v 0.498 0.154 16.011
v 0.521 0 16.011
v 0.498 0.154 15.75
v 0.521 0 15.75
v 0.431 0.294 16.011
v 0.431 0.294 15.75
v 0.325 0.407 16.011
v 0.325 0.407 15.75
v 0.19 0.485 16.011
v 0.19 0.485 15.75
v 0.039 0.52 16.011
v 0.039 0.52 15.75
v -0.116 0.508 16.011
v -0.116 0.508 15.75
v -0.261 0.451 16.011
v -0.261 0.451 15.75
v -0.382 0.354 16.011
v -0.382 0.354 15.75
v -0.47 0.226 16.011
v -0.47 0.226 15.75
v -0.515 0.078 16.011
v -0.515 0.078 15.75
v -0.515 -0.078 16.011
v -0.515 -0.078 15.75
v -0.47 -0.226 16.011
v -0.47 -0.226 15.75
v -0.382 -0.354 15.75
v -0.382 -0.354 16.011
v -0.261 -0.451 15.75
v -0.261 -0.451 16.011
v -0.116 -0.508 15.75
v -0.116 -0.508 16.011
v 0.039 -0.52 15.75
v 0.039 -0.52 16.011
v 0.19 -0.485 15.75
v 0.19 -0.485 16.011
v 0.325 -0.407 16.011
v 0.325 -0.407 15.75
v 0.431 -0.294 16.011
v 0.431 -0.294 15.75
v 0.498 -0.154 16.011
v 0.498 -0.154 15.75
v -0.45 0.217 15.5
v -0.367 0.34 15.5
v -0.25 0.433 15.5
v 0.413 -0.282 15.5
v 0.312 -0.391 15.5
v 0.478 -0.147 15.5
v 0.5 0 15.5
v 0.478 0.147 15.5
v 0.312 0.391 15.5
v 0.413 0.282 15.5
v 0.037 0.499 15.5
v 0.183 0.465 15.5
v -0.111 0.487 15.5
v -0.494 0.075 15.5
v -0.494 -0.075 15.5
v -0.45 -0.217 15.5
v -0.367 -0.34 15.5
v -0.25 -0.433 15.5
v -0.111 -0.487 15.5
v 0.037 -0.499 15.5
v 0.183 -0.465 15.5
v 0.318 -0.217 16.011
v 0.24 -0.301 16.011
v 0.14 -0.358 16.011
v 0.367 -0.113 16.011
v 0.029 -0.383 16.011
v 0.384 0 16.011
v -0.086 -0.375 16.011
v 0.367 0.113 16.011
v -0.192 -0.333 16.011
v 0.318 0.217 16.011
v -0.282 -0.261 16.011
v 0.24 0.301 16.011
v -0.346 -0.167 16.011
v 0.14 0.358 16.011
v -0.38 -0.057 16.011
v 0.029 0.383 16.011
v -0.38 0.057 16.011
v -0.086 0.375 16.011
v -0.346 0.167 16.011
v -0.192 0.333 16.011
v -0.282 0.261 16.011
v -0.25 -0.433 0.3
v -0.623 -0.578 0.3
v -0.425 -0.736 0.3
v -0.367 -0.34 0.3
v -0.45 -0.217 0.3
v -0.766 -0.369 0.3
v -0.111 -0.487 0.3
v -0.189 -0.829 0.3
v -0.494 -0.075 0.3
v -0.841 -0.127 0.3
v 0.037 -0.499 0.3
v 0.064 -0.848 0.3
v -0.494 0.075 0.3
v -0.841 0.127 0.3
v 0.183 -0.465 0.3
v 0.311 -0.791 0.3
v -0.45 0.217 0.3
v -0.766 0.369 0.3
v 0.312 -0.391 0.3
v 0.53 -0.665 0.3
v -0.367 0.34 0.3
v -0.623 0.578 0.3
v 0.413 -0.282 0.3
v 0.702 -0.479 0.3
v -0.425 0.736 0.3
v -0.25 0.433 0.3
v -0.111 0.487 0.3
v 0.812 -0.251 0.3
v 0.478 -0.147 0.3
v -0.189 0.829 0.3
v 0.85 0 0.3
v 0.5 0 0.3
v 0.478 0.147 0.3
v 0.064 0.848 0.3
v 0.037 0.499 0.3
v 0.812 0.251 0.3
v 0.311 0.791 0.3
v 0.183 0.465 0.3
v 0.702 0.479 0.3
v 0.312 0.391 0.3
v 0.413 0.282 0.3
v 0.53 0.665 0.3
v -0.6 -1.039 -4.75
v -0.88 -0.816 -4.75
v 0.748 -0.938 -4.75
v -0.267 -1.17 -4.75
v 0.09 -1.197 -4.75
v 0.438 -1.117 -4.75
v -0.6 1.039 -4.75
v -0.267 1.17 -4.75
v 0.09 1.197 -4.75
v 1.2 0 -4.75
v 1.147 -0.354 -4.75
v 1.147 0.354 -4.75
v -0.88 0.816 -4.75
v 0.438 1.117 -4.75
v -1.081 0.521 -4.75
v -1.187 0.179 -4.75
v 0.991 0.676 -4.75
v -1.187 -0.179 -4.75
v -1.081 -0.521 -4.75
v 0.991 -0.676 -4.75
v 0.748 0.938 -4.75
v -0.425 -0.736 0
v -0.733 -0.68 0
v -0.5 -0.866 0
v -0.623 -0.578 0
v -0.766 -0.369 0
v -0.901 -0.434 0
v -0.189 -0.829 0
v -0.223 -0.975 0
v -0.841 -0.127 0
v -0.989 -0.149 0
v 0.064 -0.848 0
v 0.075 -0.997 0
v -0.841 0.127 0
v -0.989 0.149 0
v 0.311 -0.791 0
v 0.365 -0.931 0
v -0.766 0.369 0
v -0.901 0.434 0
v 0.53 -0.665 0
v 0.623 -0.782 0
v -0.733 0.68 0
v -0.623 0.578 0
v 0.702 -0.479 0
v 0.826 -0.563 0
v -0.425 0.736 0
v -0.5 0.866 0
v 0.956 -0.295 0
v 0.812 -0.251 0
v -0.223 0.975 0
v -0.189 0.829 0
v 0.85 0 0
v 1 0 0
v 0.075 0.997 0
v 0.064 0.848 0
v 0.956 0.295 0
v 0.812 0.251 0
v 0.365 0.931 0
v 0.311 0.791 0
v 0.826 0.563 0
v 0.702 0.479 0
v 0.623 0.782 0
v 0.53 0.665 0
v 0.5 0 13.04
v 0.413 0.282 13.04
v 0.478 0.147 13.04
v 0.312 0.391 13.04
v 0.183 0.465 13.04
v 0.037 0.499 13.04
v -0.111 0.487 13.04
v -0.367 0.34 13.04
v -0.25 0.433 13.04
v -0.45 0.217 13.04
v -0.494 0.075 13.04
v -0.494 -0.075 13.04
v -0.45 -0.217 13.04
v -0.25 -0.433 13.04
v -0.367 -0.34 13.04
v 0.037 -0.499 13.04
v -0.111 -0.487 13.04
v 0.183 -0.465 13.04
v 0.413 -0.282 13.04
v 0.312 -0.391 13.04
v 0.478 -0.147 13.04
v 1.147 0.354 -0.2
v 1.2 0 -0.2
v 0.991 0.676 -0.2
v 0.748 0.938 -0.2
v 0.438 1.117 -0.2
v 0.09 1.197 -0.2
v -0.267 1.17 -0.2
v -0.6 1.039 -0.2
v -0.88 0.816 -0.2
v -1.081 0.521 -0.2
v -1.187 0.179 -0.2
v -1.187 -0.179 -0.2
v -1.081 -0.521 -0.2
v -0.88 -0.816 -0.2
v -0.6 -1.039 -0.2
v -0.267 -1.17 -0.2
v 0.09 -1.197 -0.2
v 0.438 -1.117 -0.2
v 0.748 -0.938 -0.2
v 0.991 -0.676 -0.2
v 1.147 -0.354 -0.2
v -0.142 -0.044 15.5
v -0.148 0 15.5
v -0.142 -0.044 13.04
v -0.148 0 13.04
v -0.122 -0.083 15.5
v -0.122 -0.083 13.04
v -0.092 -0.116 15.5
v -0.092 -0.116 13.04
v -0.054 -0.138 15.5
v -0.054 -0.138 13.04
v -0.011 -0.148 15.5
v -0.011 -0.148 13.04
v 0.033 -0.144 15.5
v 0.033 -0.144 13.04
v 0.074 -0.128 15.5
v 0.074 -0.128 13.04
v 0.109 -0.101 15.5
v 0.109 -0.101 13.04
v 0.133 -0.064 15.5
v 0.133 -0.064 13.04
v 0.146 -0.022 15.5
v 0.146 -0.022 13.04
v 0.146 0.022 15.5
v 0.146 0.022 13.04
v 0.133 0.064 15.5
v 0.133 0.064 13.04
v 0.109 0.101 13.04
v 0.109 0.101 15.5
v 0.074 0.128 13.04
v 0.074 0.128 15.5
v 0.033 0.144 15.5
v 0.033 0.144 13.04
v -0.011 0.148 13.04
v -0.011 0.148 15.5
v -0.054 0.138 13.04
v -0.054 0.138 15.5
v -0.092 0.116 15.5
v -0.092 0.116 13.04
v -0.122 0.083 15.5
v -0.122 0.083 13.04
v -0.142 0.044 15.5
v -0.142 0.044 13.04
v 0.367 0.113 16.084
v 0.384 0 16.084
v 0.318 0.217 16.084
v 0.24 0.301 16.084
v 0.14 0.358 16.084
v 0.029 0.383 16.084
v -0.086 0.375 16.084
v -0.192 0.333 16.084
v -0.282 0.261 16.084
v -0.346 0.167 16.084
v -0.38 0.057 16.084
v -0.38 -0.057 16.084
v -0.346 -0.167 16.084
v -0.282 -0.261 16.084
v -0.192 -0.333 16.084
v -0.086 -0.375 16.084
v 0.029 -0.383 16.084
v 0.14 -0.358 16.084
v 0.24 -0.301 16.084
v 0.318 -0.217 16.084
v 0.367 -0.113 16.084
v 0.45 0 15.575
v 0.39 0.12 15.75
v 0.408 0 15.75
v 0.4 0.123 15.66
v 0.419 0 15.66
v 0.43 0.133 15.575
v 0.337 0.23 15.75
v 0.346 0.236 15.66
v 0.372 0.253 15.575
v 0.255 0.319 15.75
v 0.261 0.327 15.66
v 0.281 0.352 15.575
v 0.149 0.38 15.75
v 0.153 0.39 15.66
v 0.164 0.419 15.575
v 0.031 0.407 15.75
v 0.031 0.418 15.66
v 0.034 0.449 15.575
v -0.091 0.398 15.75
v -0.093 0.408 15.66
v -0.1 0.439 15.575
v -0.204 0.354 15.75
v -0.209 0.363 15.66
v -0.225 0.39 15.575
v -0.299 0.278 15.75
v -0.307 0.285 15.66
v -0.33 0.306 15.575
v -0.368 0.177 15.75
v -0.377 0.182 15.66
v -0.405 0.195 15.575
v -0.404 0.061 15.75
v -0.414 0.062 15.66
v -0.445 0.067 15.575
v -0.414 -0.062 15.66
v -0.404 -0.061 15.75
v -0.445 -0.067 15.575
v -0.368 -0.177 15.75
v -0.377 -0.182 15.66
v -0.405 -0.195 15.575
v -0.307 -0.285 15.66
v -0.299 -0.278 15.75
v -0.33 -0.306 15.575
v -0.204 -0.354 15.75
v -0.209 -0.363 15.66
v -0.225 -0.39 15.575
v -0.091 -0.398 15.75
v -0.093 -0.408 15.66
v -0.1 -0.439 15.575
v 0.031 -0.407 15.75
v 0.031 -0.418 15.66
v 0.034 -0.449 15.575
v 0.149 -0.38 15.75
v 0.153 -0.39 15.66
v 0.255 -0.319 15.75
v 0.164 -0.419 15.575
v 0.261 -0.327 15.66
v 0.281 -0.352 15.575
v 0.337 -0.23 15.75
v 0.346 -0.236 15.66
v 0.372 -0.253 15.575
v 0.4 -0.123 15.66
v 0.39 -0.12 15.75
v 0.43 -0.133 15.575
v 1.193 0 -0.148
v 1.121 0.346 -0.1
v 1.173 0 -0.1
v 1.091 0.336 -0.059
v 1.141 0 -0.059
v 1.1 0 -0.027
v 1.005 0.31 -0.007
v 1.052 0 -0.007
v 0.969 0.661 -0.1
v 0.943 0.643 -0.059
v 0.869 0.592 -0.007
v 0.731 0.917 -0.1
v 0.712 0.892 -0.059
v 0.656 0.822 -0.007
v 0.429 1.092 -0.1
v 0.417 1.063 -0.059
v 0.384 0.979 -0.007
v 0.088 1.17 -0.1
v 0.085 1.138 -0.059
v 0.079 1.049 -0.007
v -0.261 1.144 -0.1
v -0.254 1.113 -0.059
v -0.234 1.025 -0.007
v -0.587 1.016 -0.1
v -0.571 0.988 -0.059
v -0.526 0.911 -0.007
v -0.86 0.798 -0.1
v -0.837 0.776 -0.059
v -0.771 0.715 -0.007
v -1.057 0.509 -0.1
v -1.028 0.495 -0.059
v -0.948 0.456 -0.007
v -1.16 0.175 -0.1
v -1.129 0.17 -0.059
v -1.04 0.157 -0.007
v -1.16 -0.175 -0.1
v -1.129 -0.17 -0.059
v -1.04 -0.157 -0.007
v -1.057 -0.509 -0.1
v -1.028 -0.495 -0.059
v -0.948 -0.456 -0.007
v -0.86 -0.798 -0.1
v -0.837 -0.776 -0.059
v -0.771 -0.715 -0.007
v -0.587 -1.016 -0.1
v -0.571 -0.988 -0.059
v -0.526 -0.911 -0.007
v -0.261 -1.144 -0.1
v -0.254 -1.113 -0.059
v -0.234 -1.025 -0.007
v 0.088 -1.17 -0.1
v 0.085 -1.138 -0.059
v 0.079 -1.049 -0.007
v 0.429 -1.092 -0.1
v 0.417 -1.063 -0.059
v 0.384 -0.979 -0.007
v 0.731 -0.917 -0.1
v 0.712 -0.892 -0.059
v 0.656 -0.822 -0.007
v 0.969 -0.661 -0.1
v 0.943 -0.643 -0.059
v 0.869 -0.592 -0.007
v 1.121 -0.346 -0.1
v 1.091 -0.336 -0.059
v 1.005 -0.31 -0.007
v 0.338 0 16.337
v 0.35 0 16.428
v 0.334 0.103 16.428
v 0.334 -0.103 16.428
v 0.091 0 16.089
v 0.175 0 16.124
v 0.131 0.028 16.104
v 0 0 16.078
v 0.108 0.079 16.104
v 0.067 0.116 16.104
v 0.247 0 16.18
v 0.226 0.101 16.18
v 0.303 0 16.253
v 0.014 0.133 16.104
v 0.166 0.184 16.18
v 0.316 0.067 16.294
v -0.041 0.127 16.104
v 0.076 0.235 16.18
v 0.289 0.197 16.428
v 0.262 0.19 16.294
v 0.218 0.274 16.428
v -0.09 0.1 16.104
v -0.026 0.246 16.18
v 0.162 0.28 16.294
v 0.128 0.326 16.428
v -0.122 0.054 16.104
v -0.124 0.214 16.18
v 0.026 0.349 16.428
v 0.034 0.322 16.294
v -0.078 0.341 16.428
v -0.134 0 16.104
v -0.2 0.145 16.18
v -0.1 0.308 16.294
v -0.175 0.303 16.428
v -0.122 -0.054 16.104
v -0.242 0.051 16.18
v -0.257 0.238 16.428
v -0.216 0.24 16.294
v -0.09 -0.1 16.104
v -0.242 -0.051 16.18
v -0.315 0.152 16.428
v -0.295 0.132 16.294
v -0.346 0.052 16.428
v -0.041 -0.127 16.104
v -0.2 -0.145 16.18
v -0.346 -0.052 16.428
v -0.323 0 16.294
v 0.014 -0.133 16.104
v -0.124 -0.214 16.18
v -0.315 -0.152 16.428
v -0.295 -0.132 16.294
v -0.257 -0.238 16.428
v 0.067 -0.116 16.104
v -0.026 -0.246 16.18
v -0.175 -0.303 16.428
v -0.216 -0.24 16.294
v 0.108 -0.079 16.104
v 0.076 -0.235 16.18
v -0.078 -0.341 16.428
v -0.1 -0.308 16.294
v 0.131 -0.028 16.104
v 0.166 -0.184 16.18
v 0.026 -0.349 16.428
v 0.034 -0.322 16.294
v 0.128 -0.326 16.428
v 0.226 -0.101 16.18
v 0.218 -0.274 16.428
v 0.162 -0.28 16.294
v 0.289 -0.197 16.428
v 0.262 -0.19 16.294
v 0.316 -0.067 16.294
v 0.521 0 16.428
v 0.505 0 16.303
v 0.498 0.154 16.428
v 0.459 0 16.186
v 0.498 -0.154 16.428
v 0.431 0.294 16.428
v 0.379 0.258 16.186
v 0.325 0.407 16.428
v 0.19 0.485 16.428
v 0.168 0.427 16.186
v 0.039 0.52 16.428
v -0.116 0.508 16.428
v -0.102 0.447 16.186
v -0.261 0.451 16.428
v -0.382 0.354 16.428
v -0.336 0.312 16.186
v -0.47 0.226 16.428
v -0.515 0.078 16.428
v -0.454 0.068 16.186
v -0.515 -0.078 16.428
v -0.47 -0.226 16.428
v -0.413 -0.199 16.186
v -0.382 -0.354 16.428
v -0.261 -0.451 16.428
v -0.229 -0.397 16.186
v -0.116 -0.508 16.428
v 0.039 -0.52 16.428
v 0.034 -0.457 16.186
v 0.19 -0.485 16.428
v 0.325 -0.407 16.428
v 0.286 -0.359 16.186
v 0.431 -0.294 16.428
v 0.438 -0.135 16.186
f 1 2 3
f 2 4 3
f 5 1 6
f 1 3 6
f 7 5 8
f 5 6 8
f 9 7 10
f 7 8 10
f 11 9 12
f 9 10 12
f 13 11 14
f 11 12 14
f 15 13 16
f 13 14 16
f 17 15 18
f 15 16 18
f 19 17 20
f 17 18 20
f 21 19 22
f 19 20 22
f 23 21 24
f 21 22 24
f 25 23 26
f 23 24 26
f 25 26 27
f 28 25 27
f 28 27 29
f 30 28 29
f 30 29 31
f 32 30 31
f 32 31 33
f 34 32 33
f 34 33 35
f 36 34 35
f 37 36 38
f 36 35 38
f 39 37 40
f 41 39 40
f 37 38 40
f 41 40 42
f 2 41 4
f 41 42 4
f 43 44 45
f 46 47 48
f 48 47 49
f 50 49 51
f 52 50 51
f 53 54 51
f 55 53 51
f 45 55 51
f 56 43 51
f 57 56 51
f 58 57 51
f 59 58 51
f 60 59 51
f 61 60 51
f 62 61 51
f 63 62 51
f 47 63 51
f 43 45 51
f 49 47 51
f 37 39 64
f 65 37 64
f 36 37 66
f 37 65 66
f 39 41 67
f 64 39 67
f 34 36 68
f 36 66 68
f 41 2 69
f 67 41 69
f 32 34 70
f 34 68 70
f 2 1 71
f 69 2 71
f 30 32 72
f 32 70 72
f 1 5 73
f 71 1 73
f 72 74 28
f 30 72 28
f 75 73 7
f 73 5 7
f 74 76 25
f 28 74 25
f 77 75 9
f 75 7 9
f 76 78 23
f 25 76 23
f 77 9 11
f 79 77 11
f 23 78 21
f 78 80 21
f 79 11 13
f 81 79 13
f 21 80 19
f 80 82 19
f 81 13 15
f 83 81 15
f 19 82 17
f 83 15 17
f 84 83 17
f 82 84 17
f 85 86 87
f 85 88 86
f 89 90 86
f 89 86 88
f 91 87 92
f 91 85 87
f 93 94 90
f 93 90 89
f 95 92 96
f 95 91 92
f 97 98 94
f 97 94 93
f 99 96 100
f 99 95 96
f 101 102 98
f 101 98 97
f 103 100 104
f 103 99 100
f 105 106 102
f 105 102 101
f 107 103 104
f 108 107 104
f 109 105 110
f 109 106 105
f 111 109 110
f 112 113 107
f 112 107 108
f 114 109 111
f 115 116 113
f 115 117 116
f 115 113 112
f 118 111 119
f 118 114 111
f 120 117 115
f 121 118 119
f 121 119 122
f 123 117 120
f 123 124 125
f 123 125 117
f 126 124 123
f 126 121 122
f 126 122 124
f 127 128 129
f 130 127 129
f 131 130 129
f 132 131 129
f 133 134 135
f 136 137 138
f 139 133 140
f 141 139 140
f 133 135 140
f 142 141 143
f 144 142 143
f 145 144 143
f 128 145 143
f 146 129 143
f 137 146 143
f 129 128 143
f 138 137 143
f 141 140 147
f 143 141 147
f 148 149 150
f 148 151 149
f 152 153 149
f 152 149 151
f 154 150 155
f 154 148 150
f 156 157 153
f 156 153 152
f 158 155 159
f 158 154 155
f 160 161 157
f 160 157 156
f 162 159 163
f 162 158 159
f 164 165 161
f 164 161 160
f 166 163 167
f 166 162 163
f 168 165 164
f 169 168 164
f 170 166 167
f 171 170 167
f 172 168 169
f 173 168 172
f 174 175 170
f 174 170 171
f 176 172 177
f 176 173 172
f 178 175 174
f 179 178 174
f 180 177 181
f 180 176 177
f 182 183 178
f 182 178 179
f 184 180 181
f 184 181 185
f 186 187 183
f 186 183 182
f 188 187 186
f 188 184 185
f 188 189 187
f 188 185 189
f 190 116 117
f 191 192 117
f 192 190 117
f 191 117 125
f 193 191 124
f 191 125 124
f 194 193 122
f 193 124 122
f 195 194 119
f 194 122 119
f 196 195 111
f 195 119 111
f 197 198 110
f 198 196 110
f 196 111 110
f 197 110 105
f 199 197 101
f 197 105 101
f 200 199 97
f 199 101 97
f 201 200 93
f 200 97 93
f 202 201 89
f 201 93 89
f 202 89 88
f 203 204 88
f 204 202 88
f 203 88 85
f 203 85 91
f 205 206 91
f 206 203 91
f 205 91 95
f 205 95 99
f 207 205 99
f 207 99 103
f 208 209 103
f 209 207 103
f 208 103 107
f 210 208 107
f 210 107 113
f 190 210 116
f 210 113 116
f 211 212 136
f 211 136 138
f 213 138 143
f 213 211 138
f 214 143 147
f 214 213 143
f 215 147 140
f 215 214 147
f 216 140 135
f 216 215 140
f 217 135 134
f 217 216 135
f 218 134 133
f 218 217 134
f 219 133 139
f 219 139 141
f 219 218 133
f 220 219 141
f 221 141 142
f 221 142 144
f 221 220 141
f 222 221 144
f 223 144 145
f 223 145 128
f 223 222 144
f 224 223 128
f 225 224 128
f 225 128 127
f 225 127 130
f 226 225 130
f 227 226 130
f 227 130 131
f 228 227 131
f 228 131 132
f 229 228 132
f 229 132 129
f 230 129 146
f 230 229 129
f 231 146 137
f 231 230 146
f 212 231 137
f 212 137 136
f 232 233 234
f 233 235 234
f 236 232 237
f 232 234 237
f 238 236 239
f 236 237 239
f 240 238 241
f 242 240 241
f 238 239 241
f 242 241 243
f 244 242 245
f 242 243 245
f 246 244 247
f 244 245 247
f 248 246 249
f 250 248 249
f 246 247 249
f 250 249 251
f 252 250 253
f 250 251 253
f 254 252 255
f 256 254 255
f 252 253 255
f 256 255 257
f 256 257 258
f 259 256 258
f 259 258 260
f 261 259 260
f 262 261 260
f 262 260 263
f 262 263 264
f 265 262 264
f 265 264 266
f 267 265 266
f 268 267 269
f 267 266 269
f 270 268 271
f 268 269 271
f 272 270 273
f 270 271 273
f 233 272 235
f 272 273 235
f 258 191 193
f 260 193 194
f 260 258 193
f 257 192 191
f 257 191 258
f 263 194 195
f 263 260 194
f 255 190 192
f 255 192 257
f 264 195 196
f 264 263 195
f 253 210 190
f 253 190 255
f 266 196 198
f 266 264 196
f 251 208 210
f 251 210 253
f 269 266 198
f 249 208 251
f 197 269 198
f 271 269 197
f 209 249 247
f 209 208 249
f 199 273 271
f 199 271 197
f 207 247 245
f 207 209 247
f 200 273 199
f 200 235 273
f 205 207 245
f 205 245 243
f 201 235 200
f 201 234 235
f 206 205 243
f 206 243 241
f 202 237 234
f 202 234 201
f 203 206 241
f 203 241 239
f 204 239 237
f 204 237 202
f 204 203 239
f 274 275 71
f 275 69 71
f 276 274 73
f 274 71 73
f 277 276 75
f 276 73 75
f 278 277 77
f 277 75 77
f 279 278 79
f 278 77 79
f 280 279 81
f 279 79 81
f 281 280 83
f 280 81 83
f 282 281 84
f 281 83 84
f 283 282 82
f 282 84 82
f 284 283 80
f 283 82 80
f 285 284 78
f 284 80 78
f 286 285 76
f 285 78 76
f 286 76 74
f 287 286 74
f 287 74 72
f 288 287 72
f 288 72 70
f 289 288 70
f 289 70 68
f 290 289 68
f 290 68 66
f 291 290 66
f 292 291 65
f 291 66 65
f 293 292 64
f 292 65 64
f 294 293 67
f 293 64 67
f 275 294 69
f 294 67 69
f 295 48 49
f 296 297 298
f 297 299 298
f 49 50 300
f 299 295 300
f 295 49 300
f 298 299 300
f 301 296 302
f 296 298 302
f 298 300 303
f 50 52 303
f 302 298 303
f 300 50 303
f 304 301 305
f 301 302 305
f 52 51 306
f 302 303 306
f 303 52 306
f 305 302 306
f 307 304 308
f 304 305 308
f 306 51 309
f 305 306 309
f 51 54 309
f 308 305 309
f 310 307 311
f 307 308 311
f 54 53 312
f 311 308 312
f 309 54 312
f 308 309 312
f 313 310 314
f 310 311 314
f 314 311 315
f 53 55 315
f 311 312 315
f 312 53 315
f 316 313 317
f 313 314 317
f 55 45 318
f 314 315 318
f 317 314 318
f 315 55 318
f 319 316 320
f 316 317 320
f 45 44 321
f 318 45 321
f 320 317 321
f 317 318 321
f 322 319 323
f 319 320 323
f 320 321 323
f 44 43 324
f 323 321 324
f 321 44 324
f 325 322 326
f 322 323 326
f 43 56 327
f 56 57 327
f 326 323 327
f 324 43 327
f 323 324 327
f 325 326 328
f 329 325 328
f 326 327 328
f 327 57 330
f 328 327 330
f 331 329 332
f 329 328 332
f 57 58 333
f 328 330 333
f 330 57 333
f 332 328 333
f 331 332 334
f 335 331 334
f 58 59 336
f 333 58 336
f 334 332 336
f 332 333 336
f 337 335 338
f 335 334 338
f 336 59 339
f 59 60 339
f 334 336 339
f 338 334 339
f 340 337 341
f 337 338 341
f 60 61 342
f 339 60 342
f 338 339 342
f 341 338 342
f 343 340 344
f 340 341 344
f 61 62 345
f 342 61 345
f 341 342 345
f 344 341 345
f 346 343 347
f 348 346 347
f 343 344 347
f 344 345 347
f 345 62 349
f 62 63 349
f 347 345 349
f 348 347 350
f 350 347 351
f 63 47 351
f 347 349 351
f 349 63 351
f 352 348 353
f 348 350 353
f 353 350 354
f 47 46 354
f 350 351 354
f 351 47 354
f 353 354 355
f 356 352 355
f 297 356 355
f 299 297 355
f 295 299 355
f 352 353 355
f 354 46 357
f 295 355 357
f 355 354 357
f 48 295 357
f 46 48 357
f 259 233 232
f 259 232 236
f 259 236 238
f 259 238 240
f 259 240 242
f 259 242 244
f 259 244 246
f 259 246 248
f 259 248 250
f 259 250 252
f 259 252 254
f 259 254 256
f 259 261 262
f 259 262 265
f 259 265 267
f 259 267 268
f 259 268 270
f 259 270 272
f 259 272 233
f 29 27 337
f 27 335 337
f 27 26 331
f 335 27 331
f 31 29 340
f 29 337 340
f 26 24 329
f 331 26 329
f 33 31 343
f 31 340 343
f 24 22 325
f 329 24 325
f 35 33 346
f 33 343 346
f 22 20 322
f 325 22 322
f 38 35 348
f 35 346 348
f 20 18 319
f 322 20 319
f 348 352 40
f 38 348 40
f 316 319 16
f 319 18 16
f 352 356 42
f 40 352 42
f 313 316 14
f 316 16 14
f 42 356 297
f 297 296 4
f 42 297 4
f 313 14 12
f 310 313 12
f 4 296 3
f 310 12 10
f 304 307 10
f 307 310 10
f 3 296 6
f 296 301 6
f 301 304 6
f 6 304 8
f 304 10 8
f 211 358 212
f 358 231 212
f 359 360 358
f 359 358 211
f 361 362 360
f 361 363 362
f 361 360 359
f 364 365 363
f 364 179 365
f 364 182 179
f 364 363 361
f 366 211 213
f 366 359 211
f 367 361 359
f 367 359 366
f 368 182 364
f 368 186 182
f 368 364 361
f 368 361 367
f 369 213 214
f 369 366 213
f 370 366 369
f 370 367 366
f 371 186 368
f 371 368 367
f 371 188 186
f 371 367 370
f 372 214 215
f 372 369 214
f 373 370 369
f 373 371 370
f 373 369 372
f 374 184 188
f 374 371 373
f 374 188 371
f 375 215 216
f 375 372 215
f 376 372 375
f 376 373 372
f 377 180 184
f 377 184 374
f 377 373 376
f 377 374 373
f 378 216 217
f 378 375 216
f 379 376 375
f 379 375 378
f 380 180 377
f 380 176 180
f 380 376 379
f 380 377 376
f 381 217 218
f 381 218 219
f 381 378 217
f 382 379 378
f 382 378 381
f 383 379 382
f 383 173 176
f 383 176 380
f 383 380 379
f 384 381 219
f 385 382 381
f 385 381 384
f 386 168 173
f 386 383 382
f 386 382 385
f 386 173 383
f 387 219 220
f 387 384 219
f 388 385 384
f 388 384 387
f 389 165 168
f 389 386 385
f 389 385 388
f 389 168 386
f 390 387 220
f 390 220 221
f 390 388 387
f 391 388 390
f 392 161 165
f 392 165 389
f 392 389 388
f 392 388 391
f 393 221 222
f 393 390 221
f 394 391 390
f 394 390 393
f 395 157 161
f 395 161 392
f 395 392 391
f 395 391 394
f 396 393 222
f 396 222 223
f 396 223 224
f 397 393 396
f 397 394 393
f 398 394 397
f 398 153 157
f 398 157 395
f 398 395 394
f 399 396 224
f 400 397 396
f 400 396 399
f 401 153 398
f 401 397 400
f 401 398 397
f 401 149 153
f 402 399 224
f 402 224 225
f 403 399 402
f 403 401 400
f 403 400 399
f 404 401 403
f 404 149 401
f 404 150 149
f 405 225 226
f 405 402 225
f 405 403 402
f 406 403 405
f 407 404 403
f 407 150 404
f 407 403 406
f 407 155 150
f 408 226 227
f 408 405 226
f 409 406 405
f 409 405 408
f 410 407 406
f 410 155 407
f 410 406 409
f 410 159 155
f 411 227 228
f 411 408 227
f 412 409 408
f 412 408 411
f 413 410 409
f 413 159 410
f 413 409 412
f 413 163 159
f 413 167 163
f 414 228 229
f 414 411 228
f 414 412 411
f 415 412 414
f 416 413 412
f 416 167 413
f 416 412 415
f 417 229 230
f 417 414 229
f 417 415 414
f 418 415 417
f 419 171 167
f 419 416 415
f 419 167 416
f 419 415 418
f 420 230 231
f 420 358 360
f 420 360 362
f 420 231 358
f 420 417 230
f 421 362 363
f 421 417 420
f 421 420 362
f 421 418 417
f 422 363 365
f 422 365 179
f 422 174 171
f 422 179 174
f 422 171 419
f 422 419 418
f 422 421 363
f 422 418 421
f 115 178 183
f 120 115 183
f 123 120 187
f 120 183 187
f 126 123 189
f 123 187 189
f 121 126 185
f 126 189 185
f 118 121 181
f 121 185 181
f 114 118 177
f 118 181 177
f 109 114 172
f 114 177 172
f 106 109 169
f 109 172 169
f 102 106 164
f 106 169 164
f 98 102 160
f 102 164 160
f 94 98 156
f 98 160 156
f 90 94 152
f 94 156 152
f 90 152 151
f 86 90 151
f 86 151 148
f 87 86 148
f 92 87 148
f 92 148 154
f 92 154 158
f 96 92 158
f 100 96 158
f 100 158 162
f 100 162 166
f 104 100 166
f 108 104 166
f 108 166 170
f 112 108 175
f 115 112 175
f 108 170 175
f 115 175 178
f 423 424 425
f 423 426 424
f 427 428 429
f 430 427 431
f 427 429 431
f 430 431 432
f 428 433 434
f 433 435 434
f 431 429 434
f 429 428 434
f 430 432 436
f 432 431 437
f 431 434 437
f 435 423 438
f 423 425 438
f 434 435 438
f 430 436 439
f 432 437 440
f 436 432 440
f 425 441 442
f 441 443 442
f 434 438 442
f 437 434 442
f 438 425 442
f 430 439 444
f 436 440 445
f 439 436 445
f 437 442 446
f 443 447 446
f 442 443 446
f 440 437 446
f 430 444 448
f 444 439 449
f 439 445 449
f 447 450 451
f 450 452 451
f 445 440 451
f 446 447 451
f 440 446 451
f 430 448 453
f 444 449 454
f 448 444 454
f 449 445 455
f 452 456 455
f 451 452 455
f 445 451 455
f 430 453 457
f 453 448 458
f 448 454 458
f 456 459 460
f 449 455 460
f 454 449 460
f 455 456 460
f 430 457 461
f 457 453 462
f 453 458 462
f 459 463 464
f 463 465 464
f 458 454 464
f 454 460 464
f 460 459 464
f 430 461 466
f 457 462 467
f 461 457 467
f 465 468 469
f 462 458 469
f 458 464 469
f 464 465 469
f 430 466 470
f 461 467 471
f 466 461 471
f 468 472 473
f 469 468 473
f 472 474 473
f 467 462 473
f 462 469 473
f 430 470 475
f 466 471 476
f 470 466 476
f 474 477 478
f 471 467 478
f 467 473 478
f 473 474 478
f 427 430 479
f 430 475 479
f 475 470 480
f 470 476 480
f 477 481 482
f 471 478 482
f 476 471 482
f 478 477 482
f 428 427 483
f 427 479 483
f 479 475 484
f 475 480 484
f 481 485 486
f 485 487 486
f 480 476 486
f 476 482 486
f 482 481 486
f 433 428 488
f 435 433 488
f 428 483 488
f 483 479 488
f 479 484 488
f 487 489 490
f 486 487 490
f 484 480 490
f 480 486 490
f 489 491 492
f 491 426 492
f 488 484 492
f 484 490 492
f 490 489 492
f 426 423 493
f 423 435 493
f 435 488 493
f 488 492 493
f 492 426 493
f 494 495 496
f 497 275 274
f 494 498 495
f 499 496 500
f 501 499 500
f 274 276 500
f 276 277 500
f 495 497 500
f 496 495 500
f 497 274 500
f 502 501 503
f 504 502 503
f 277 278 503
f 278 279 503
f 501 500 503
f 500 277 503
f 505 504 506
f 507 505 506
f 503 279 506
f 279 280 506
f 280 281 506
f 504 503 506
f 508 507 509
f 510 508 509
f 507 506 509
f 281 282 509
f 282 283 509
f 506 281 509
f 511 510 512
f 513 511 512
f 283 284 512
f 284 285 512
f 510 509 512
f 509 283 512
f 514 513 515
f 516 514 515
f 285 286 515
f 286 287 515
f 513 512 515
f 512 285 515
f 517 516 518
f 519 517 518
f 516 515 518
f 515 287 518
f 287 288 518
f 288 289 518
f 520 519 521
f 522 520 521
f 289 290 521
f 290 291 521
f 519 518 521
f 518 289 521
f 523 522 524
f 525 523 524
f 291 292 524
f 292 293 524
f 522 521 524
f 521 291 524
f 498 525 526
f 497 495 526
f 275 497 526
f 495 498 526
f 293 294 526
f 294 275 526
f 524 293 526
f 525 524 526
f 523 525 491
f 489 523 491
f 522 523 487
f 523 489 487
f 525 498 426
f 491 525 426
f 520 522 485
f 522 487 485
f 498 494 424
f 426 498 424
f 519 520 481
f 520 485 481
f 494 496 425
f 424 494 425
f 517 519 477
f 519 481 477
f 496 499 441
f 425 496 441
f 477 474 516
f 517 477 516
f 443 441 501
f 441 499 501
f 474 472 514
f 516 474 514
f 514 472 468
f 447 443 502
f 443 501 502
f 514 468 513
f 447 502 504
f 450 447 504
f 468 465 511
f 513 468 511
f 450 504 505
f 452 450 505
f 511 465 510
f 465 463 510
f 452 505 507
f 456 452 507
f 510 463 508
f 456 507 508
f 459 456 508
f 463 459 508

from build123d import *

# Parameters (mm, degrees)
SKETCH1_R           = 0.5
BOSS_EXTRUDE1_DEPTH = 15.5
SKETCH1_3_R         = 1.2
BOSS_EXTRUDE2_DEPTH = 4.75
FILLET1_R           = 0.2
SKETCH8_W           = 0.783973705
SKETCH8_H           = 2.46
SKETCH9_R           = 0.85
BOSS_EXTRUDE5_DEPTH = 0.3


with BuildPart() as part:
    # Sketch1 → Boss-Extrude1 (new body)
    with BuildSketch(Plane.XY):
        Circle(SKETCH1_R)
    extrude(amount=BOSS_EXTRUDE1_DEPTH)

    # Sketch8 → Cut-Revolve2 (revolve, cut)
    with BuildSketch(Plane(origin=(0, 0, 0), x_dir=(1, 0, 0), z_dir=(0, 1, 0))):
        with Locations((-0.540086852, -14.27)):
            Rectangle(SKETCH8_W, SKETCH8_H)
    revolve(axis=Axis((0, 0, 15.5), (0, 0, 1)), mode=Mode.SUBTRACT)



with BuildPart() as body_2:
    # Sketch1<3> → Boss-Extrude2 (new body)
    with BuildSketch(Plane.XY):
        Circle(SKETCH1_3_R)
    extrude(amount=-BOSS_EXTRUDE2_DEPTH)

    # Fillet1
    fillet1_edges = [body_2.edges().sort_by_distance(p)[0] for p in [
        (-1.2, 0, 0),
    ]]
    fillet(fillet1_edges, radius=FILLET1_R)


with BuildPart() as body_3:
    # Sketch3 → Revolve1 (revolve)
    with BuildSketch(Plane(origin=(0, 0, 0), x_dir=(1, 0, 0), z_dir=(0, 1, 0))):
        with BuildLine():
            Line((0.5, -15.5), (0, -15.5))
            Line((0, -15.5), (0, -16.0775))
            ThreePointArc((0, -16.0775), (0.247487373, -16.180012627), (0.35, -16.4275))
            Line((0.35, -16.4275), (0.521160332, -16.4275))
            ThreePointArc((0.521160332, -16.4275), (0.485718669, -16.242606648), (0.384418127, -16.083925008))
            Line((0.384418127, -16.083925008), (0.384418127, -16.010569997))
            Line((0.384418127, -16.010569997), (0.521160332, -16.010569997))
            Line((0.521160332, -16.010569997), (0.521160332, -15.749819222))
            Line((0.521160332, -15.749819222), (0.40822727, -15.749819222))
            ThreePointArc((0.40822727, -15.749819222), (0.4318963, -15.616747927), (0.5, -15.5))
        make_face()
    revolve(axis=Axis((0, 0, 15.5), (0, 0, 1)))


with BuildPart() as part_1:
    add(part.part)

    add(body_2.part)  # Boss-Extrude5 merges body 2
    # Sketch9 → Boss-Extrude5 (add)
    with BuildSketch(Plane.XY):
        Circle(SKETCH9_R)
    extrude(amount=BOSS_EXTRUDE5_DEPTH)


solid = Compound([body_3.part, part_1.part])
